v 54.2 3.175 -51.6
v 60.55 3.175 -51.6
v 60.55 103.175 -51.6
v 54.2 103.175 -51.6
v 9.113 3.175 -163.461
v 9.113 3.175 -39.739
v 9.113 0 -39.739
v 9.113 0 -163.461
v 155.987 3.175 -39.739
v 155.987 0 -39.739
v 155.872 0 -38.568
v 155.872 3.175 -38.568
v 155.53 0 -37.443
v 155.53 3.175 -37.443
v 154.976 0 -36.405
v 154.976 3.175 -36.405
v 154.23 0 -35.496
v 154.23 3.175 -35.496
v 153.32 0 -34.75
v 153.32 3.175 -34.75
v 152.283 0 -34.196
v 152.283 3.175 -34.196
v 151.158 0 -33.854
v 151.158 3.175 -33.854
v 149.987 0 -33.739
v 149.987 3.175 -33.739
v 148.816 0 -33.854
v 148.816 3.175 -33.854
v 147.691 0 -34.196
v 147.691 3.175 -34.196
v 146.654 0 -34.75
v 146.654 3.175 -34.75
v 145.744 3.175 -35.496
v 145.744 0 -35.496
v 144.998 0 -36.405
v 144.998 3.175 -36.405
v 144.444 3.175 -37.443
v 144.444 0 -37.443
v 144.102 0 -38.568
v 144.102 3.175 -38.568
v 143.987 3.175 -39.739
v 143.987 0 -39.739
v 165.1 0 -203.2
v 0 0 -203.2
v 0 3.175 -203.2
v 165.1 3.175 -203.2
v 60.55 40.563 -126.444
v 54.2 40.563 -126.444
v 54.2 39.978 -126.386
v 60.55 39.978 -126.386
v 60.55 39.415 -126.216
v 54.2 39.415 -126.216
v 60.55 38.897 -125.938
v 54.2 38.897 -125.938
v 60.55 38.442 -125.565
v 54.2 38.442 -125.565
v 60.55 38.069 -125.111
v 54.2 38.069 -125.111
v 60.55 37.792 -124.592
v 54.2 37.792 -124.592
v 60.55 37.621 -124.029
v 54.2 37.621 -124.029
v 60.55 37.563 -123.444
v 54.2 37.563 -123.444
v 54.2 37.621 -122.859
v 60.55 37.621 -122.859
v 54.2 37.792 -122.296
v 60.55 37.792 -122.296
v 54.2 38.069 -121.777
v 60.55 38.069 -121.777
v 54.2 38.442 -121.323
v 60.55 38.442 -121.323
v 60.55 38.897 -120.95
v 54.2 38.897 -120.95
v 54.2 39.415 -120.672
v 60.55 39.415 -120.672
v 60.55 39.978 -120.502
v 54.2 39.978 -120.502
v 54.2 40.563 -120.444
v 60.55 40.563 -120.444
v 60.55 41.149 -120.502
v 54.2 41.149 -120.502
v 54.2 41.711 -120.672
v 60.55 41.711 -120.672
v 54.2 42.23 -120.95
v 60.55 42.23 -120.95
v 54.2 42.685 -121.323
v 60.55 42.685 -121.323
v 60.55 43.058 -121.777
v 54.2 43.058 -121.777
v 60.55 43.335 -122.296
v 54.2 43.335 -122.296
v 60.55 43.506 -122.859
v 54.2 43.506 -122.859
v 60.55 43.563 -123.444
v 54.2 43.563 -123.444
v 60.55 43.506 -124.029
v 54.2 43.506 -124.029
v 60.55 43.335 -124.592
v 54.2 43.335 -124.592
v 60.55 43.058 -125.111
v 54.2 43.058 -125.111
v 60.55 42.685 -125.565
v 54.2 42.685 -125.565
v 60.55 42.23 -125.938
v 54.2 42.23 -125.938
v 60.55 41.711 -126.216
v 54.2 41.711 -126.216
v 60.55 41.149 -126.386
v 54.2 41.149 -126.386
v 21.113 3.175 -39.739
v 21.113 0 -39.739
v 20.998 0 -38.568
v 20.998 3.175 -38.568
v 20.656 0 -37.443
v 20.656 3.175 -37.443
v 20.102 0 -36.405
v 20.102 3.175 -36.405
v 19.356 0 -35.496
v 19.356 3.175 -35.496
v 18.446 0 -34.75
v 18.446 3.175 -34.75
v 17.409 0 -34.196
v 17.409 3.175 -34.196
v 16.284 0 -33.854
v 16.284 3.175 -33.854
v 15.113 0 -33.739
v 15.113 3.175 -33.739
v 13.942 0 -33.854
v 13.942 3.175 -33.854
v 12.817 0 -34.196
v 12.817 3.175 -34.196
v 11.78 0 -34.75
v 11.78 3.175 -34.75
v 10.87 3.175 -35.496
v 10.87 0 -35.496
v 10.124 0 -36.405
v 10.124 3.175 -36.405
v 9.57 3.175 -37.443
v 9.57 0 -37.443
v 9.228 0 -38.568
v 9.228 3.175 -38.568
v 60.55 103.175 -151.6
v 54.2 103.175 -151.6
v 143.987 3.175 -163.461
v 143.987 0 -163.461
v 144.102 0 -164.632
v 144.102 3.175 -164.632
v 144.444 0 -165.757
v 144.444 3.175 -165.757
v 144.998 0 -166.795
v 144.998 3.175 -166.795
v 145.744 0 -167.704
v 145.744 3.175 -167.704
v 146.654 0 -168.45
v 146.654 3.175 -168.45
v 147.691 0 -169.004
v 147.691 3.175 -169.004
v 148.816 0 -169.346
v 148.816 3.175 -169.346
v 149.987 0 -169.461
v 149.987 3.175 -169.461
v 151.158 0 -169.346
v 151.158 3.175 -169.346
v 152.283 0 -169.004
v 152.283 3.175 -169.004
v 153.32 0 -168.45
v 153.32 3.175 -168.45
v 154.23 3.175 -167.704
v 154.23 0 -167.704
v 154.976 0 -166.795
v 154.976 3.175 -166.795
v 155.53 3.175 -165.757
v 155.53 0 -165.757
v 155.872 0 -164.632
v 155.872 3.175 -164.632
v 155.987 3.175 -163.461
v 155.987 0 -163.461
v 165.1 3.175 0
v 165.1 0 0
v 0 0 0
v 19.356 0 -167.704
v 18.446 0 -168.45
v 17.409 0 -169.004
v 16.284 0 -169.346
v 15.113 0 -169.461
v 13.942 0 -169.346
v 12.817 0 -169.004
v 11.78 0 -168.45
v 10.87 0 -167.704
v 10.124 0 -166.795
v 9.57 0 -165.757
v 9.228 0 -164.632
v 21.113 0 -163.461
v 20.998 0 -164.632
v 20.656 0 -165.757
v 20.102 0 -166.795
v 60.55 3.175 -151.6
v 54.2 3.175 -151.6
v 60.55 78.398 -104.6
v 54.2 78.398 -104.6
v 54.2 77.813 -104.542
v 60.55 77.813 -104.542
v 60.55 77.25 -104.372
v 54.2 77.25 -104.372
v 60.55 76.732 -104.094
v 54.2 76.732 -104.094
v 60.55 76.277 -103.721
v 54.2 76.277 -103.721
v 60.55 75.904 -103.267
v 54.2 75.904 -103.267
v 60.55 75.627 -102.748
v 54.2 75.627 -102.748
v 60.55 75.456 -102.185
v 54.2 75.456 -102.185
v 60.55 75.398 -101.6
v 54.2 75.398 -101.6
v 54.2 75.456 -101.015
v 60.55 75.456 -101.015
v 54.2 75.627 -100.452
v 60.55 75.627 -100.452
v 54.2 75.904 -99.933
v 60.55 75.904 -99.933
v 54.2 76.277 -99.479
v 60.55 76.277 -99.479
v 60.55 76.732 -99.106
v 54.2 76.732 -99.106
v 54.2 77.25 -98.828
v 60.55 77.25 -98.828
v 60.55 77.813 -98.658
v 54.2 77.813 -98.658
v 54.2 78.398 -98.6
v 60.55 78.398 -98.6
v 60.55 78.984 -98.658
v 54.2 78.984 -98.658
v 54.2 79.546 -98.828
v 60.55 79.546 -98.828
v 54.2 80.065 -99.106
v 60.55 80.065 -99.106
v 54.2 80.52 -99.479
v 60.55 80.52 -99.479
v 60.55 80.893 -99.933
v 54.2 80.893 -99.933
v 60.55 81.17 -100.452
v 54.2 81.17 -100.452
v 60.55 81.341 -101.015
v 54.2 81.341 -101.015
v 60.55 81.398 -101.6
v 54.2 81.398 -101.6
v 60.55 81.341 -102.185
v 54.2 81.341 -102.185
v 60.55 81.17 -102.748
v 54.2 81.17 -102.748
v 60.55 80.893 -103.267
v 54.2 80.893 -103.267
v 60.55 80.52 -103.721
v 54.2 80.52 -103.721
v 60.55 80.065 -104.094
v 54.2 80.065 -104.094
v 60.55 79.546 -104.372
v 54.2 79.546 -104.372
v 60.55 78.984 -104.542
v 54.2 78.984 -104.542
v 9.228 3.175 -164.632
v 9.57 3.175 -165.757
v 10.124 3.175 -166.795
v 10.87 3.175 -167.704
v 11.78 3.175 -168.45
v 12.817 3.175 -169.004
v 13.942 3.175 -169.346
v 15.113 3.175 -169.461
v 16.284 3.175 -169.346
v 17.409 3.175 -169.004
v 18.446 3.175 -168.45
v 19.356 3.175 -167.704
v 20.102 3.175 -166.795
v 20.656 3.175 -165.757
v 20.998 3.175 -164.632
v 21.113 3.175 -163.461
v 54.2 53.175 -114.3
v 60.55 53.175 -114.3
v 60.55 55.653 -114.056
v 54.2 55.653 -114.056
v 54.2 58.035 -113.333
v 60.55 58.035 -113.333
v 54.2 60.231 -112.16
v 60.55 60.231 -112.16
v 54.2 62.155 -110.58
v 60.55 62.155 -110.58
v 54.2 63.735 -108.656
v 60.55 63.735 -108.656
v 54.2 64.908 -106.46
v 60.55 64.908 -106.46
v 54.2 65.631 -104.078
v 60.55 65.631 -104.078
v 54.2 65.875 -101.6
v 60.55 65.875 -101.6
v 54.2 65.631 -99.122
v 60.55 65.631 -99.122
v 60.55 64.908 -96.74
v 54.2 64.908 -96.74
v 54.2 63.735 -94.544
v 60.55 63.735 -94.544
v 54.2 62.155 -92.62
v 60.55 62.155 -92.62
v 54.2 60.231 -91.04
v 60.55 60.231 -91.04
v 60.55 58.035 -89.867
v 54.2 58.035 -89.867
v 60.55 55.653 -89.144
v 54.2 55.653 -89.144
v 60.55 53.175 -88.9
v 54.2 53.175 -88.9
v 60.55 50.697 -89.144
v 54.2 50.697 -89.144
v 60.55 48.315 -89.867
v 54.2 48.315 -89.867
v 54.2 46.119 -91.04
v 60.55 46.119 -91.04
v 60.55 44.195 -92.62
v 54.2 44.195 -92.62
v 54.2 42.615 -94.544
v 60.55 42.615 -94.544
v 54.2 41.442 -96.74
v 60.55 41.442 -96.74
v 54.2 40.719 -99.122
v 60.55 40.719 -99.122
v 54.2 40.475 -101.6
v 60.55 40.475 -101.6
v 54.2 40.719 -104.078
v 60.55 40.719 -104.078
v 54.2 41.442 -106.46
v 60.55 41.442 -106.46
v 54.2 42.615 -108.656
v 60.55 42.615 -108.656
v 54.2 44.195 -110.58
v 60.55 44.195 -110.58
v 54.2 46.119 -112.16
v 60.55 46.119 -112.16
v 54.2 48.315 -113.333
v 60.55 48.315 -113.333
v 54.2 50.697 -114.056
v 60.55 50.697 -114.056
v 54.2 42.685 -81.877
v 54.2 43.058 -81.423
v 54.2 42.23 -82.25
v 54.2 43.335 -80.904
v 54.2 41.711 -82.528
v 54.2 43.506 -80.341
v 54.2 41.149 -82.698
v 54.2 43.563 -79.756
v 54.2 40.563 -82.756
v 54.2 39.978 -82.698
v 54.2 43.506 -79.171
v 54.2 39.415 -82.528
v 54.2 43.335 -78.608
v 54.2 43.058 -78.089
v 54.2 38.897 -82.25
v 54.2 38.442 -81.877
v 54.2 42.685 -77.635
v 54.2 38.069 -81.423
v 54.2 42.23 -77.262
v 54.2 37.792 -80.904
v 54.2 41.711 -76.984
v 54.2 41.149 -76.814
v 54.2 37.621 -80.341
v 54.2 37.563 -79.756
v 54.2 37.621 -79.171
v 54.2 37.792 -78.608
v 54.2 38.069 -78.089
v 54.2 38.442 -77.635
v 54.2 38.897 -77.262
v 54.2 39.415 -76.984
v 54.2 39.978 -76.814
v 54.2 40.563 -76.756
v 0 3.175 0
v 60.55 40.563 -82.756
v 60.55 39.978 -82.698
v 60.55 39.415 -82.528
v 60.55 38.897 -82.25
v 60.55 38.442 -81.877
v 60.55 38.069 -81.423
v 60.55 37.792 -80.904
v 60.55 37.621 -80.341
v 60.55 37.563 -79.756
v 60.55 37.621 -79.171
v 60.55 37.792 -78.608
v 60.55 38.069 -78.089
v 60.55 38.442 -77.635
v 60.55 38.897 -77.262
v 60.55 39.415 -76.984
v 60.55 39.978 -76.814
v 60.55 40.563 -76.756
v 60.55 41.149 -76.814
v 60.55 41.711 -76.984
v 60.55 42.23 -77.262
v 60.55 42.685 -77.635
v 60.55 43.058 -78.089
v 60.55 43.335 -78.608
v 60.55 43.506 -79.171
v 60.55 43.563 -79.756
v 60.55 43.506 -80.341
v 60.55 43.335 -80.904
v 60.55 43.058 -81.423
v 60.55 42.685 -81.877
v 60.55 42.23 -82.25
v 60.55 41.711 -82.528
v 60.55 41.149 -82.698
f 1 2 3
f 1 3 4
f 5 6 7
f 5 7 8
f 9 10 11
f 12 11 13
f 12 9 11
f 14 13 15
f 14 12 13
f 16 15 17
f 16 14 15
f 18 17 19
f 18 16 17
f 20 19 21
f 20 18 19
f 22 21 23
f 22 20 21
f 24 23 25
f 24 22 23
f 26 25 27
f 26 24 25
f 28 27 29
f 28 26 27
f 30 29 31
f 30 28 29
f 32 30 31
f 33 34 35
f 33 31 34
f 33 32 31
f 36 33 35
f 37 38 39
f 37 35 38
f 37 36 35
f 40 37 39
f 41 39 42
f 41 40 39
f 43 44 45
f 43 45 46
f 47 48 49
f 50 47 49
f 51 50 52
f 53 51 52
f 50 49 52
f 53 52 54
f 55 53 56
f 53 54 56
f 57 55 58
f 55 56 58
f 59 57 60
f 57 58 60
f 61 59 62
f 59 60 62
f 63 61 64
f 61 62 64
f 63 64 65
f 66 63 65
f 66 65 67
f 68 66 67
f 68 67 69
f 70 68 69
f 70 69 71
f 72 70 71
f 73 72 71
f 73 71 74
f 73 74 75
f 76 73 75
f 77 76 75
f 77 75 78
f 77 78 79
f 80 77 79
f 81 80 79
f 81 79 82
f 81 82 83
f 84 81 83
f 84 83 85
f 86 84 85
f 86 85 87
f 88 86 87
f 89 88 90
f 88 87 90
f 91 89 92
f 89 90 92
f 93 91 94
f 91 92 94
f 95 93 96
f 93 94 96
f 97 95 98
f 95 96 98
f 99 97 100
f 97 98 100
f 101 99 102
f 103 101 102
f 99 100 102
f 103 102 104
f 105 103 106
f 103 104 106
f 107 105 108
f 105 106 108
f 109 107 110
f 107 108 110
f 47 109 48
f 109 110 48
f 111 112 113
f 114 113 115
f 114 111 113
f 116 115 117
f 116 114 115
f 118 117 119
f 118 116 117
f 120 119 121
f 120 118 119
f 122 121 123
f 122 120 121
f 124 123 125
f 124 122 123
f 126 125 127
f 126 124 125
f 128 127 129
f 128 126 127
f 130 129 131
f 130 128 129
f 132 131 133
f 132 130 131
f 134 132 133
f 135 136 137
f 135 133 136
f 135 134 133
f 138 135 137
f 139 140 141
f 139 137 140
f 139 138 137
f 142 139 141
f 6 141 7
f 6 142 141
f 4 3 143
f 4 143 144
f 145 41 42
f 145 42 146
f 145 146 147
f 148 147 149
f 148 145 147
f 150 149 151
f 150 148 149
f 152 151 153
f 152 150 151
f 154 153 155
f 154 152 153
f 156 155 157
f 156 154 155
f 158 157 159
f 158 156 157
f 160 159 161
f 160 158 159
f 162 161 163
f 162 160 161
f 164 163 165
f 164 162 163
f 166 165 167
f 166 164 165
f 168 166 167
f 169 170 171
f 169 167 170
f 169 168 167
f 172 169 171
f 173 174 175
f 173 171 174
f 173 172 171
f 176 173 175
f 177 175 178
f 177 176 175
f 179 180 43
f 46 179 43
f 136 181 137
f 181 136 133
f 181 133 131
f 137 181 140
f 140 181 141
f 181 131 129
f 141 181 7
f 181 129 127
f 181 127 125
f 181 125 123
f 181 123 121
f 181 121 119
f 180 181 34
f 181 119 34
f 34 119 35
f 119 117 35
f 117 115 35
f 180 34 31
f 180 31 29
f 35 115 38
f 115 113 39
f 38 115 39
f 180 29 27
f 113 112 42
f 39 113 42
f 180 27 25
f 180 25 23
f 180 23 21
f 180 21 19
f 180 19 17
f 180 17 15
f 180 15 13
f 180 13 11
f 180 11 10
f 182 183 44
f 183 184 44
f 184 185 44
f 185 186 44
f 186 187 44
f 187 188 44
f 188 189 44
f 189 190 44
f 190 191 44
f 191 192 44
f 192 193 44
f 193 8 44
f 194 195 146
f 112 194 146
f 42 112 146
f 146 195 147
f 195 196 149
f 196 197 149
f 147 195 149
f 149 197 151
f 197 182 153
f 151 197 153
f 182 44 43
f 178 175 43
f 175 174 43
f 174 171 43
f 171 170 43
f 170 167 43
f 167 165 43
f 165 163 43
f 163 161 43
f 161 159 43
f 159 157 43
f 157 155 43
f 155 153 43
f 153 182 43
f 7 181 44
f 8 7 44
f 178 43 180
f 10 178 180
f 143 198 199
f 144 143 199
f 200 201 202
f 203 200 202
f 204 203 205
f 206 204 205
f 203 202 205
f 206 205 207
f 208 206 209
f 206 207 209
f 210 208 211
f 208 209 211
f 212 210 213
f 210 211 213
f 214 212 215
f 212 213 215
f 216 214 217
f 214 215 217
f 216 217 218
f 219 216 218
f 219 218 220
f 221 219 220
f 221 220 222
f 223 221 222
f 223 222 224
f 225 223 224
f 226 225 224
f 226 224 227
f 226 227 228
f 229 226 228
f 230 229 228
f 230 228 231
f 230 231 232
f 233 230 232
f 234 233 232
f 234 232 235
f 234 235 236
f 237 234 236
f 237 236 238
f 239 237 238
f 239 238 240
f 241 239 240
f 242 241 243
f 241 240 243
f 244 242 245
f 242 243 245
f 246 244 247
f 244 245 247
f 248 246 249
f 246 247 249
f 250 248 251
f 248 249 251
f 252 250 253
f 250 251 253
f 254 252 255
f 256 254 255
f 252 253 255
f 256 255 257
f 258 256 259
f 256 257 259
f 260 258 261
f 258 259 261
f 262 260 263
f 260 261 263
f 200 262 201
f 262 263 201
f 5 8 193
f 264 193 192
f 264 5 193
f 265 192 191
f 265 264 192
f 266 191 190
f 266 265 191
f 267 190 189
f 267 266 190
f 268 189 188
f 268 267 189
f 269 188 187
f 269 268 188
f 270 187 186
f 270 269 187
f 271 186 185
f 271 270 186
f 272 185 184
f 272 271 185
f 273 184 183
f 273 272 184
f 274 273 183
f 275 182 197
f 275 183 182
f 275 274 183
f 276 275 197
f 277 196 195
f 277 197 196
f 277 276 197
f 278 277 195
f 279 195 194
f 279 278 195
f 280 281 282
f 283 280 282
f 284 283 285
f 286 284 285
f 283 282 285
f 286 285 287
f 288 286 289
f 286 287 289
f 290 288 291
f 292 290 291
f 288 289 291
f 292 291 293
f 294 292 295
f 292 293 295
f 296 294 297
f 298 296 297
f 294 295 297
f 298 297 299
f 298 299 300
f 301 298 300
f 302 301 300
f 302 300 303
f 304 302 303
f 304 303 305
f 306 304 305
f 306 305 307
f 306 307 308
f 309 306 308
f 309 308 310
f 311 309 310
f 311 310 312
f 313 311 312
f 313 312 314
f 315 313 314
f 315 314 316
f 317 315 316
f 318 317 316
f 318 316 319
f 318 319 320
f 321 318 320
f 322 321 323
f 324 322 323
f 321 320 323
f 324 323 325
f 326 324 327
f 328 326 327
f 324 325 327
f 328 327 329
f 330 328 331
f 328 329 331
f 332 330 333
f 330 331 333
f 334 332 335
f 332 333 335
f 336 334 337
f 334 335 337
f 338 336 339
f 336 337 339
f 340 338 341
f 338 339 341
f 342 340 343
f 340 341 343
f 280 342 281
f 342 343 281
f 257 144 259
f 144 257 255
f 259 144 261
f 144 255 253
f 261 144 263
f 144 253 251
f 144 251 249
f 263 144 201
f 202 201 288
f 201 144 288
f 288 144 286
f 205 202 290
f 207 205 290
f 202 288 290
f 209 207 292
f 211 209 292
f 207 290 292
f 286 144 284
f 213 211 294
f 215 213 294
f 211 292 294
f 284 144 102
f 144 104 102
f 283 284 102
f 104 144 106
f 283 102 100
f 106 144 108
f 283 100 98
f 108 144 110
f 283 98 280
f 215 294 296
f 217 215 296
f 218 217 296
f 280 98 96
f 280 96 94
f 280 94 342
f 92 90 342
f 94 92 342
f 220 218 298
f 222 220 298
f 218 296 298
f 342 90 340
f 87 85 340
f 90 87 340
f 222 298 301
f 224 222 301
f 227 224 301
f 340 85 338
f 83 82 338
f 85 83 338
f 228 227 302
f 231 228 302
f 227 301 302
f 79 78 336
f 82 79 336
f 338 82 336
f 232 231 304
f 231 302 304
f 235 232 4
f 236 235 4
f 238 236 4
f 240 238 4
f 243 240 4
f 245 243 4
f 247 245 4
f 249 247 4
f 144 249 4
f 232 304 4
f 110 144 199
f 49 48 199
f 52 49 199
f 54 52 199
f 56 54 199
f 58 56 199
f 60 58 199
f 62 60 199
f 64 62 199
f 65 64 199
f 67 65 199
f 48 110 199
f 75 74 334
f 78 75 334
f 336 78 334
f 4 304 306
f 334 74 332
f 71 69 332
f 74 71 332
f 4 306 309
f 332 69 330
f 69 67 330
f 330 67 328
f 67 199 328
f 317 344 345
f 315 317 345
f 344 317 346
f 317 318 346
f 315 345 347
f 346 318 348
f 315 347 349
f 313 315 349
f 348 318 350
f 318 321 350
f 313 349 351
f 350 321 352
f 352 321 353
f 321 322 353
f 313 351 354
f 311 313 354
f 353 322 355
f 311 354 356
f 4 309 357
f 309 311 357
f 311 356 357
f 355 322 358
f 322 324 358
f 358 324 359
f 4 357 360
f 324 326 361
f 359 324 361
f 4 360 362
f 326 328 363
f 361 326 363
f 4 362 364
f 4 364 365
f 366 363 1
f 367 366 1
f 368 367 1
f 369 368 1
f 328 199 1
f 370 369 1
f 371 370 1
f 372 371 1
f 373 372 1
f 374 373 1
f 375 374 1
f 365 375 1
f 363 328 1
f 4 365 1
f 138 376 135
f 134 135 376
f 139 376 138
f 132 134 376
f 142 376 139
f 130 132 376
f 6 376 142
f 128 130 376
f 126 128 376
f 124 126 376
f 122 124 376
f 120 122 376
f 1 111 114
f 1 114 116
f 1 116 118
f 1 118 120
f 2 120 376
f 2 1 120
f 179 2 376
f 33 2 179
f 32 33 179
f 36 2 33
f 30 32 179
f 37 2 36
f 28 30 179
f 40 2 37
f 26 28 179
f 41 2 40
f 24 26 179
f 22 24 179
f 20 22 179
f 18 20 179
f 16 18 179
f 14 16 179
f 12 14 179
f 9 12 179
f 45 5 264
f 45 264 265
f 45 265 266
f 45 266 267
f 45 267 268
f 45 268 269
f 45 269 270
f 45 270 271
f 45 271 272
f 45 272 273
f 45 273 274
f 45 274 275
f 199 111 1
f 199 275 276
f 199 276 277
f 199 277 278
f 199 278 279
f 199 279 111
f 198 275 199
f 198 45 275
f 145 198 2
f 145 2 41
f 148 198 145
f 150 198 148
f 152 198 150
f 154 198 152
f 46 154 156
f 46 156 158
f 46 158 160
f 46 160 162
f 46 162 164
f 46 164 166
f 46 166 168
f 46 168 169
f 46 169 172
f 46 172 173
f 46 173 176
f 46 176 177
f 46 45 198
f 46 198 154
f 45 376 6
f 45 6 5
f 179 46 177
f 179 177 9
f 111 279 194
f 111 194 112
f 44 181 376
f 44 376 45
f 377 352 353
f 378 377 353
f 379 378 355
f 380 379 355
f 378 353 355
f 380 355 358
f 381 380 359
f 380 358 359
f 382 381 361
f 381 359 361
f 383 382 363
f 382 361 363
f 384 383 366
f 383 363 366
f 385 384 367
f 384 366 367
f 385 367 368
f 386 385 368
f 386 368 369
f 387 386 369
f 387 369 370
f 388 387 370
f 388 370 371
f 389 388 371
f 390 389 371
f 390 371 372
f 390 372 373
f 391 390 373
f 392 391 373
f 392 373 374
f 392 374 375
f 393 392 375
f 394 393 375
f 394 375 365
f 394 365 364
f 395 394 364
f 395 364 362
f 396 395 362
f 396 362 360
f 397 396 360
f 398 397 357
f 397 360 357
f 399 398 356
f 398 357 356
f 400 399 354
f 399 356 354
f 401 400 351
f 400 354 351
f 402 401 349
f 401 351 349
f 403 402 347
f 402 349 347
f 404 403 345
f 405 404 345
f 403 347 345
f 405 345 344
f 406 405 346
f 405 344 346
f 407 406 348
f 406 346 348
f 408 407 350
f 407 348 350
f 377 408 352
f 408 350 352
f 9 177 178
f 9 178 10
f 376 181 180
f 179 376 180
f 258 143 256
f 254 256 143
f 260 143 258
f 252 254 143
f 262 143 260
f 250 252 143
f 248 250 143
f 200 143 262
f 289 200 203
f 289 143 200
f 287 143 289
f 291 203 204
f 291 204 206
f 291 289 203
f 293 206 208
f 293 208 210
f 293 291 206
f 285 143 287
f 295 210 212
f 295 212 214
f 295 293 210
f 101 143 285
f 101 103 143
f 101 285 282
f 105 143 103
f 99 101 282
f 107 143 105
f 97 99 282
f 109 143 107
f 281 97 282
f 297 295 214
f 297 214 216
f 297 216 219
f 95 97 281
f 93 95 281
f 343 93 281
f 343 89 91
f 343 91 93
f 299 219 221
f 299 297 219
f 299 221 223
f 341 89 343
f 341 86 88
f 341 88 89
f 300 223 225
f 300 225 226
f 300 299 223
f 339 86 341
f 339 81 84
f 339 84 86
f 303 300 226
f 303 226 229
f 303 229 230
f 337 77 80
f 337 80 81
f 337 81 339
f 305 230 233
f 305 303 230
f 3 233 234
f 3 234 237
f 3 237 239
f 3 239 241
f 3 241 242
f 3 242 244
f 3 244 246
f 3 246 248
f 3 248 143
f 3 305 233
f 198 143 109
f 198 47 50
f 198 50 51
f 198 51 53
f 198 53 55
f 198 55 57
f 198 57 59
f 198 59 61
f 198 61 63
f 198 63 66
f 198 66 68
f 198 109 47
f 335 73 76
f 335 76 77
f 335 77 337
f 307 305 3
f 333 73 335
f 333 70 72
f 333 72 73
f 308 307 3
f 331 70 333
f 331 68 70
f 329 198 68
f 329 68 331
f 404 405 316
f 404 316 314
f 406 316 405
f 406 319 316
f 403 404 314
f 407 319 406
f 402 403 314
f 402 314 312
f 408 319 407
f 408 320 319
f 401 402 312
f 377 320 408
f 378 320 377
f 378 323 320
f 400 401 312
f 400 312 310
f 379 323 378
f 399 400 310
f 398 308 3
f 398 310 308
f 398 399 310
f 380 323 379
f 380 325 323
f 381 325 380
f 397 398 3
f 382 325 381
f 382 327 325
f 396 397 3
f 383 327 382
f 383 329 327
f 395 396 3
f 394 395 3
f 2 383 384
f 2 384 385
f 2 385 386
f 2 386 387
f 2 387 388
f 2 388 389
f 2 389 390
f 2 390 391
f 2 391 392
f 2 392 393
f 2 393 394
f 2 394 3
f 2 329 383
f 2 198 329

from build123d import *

# Parameters (mm, degrees)
SKETCH1_W                = 165.1
SKETCH1_H                = 203.2
BOSS_EXTRUDE1_DEPTH      = 3.175
CUT_EXTRUDE1_DEPTH       = 4.175
SKETCH3_W                = 6.35
SKETCH3_H                = 100
BOSS_EXTRUDE2_DEPTH      = 100
F_6_0_6_DIAMETER_HOLE1_D = 6
SKETCH4_R                = 12.7
CUT_EXTRUDE2_DEPTH       = 61.549652809


with BuildPart() as part:
    # Sketch1 → Boss-Extrude1 (new body)
    with BuildSketch(Plane(origin=(0, 0, 0), x_dir=(1, 0, 0), z_dir=(0, 1, 0))):
        with Locations((82.55, 101.6)):
            Rectangle(SKETCH1_W, SKETCH1_H)
    extrude(amount=BOSS_EXTRUDE1_DEPTH)

    # Sketch2 → Cut-Extrude1 (cut, through all)
    with BuildSketch(Plane(origin=(0, 3.175, 0), x_dir=(-1, 0, 0), z_dir=(0, 1, 0))):
        with BuildLine():
            Line((-9.113, -39.738854308), (-9.113, -163.461145692))
            ThreePointArc((-9.113, -163.461145692), (-15.113, -169.461145692), (-21.113, -163.461145692))
            Line((-21.113, -163.461145692), (-21.113, -39.738854308))
            ThreePointArc((-21.113, -39.738854308), (-15.113, -33.738854308), (-9.113, -39.738854308))
        make_face()
        with BuildLine():
            Line((-143.987, -39.738854308), (-143.987, -163.461145692))
            ThreePointArc((-143.987, -163.461145692), (-149.987, -169.461145692), (-155.987, -163.461145692))
            Line((-155.987, -163.461145692), (-155.987, -39.738854308))
            ThreePointArc((-155.987, -39.738854308), (-149.987, -33.738854308), (-143.987, -39.738854308))
        make_face()
    extrude(amount=-CUT_EXTRUDE1_DEPTH, mode=Mode.SUBTRACT)

    # Sketch3 → Boss-Extrude2 (add)
    with BuildSketch(Plane(origin=(0, 3.175, 0), x_dir=(-1, 0, 0), z_dir=(0, 1, 0))):
        with Locations((-57.374652809, -101.6)):
            Rectangle(SKETCH3_W, SKETCH3_H)
    extrude(amount=BOSS_EXTRUDE2_DEPTH)

    # Ø6.0 (6) Diameter Hole1 (through all)
    with Locations(Plane(origin=(60.549652809, 78.39827856, -101.6), x_dir=(0, 0, 1), z_dir=(1, 0, 0))):
        with Locations((0, 0), (21.844, 37.83491784), (-21.844, 37.83491784)):
            Hole(F_6_0_6_DIAMETER_HOLE1_D / 2)

    # Sketch4 → Cut-Extrude2 (cut, through all)
    with BuildSketch(Plane(origin=(60.549652809, 0, 0), x_dir=(0, 0, -1), z_dir=(1, 0, 0))):
        with Locations((101.6, 53.175)):
            Circle(SKETCH4_R)
    extrude(amount=-CUT_EXTRUDE2_DEPTH, mode=Mode.SUBTRACT)


solid = part.part
